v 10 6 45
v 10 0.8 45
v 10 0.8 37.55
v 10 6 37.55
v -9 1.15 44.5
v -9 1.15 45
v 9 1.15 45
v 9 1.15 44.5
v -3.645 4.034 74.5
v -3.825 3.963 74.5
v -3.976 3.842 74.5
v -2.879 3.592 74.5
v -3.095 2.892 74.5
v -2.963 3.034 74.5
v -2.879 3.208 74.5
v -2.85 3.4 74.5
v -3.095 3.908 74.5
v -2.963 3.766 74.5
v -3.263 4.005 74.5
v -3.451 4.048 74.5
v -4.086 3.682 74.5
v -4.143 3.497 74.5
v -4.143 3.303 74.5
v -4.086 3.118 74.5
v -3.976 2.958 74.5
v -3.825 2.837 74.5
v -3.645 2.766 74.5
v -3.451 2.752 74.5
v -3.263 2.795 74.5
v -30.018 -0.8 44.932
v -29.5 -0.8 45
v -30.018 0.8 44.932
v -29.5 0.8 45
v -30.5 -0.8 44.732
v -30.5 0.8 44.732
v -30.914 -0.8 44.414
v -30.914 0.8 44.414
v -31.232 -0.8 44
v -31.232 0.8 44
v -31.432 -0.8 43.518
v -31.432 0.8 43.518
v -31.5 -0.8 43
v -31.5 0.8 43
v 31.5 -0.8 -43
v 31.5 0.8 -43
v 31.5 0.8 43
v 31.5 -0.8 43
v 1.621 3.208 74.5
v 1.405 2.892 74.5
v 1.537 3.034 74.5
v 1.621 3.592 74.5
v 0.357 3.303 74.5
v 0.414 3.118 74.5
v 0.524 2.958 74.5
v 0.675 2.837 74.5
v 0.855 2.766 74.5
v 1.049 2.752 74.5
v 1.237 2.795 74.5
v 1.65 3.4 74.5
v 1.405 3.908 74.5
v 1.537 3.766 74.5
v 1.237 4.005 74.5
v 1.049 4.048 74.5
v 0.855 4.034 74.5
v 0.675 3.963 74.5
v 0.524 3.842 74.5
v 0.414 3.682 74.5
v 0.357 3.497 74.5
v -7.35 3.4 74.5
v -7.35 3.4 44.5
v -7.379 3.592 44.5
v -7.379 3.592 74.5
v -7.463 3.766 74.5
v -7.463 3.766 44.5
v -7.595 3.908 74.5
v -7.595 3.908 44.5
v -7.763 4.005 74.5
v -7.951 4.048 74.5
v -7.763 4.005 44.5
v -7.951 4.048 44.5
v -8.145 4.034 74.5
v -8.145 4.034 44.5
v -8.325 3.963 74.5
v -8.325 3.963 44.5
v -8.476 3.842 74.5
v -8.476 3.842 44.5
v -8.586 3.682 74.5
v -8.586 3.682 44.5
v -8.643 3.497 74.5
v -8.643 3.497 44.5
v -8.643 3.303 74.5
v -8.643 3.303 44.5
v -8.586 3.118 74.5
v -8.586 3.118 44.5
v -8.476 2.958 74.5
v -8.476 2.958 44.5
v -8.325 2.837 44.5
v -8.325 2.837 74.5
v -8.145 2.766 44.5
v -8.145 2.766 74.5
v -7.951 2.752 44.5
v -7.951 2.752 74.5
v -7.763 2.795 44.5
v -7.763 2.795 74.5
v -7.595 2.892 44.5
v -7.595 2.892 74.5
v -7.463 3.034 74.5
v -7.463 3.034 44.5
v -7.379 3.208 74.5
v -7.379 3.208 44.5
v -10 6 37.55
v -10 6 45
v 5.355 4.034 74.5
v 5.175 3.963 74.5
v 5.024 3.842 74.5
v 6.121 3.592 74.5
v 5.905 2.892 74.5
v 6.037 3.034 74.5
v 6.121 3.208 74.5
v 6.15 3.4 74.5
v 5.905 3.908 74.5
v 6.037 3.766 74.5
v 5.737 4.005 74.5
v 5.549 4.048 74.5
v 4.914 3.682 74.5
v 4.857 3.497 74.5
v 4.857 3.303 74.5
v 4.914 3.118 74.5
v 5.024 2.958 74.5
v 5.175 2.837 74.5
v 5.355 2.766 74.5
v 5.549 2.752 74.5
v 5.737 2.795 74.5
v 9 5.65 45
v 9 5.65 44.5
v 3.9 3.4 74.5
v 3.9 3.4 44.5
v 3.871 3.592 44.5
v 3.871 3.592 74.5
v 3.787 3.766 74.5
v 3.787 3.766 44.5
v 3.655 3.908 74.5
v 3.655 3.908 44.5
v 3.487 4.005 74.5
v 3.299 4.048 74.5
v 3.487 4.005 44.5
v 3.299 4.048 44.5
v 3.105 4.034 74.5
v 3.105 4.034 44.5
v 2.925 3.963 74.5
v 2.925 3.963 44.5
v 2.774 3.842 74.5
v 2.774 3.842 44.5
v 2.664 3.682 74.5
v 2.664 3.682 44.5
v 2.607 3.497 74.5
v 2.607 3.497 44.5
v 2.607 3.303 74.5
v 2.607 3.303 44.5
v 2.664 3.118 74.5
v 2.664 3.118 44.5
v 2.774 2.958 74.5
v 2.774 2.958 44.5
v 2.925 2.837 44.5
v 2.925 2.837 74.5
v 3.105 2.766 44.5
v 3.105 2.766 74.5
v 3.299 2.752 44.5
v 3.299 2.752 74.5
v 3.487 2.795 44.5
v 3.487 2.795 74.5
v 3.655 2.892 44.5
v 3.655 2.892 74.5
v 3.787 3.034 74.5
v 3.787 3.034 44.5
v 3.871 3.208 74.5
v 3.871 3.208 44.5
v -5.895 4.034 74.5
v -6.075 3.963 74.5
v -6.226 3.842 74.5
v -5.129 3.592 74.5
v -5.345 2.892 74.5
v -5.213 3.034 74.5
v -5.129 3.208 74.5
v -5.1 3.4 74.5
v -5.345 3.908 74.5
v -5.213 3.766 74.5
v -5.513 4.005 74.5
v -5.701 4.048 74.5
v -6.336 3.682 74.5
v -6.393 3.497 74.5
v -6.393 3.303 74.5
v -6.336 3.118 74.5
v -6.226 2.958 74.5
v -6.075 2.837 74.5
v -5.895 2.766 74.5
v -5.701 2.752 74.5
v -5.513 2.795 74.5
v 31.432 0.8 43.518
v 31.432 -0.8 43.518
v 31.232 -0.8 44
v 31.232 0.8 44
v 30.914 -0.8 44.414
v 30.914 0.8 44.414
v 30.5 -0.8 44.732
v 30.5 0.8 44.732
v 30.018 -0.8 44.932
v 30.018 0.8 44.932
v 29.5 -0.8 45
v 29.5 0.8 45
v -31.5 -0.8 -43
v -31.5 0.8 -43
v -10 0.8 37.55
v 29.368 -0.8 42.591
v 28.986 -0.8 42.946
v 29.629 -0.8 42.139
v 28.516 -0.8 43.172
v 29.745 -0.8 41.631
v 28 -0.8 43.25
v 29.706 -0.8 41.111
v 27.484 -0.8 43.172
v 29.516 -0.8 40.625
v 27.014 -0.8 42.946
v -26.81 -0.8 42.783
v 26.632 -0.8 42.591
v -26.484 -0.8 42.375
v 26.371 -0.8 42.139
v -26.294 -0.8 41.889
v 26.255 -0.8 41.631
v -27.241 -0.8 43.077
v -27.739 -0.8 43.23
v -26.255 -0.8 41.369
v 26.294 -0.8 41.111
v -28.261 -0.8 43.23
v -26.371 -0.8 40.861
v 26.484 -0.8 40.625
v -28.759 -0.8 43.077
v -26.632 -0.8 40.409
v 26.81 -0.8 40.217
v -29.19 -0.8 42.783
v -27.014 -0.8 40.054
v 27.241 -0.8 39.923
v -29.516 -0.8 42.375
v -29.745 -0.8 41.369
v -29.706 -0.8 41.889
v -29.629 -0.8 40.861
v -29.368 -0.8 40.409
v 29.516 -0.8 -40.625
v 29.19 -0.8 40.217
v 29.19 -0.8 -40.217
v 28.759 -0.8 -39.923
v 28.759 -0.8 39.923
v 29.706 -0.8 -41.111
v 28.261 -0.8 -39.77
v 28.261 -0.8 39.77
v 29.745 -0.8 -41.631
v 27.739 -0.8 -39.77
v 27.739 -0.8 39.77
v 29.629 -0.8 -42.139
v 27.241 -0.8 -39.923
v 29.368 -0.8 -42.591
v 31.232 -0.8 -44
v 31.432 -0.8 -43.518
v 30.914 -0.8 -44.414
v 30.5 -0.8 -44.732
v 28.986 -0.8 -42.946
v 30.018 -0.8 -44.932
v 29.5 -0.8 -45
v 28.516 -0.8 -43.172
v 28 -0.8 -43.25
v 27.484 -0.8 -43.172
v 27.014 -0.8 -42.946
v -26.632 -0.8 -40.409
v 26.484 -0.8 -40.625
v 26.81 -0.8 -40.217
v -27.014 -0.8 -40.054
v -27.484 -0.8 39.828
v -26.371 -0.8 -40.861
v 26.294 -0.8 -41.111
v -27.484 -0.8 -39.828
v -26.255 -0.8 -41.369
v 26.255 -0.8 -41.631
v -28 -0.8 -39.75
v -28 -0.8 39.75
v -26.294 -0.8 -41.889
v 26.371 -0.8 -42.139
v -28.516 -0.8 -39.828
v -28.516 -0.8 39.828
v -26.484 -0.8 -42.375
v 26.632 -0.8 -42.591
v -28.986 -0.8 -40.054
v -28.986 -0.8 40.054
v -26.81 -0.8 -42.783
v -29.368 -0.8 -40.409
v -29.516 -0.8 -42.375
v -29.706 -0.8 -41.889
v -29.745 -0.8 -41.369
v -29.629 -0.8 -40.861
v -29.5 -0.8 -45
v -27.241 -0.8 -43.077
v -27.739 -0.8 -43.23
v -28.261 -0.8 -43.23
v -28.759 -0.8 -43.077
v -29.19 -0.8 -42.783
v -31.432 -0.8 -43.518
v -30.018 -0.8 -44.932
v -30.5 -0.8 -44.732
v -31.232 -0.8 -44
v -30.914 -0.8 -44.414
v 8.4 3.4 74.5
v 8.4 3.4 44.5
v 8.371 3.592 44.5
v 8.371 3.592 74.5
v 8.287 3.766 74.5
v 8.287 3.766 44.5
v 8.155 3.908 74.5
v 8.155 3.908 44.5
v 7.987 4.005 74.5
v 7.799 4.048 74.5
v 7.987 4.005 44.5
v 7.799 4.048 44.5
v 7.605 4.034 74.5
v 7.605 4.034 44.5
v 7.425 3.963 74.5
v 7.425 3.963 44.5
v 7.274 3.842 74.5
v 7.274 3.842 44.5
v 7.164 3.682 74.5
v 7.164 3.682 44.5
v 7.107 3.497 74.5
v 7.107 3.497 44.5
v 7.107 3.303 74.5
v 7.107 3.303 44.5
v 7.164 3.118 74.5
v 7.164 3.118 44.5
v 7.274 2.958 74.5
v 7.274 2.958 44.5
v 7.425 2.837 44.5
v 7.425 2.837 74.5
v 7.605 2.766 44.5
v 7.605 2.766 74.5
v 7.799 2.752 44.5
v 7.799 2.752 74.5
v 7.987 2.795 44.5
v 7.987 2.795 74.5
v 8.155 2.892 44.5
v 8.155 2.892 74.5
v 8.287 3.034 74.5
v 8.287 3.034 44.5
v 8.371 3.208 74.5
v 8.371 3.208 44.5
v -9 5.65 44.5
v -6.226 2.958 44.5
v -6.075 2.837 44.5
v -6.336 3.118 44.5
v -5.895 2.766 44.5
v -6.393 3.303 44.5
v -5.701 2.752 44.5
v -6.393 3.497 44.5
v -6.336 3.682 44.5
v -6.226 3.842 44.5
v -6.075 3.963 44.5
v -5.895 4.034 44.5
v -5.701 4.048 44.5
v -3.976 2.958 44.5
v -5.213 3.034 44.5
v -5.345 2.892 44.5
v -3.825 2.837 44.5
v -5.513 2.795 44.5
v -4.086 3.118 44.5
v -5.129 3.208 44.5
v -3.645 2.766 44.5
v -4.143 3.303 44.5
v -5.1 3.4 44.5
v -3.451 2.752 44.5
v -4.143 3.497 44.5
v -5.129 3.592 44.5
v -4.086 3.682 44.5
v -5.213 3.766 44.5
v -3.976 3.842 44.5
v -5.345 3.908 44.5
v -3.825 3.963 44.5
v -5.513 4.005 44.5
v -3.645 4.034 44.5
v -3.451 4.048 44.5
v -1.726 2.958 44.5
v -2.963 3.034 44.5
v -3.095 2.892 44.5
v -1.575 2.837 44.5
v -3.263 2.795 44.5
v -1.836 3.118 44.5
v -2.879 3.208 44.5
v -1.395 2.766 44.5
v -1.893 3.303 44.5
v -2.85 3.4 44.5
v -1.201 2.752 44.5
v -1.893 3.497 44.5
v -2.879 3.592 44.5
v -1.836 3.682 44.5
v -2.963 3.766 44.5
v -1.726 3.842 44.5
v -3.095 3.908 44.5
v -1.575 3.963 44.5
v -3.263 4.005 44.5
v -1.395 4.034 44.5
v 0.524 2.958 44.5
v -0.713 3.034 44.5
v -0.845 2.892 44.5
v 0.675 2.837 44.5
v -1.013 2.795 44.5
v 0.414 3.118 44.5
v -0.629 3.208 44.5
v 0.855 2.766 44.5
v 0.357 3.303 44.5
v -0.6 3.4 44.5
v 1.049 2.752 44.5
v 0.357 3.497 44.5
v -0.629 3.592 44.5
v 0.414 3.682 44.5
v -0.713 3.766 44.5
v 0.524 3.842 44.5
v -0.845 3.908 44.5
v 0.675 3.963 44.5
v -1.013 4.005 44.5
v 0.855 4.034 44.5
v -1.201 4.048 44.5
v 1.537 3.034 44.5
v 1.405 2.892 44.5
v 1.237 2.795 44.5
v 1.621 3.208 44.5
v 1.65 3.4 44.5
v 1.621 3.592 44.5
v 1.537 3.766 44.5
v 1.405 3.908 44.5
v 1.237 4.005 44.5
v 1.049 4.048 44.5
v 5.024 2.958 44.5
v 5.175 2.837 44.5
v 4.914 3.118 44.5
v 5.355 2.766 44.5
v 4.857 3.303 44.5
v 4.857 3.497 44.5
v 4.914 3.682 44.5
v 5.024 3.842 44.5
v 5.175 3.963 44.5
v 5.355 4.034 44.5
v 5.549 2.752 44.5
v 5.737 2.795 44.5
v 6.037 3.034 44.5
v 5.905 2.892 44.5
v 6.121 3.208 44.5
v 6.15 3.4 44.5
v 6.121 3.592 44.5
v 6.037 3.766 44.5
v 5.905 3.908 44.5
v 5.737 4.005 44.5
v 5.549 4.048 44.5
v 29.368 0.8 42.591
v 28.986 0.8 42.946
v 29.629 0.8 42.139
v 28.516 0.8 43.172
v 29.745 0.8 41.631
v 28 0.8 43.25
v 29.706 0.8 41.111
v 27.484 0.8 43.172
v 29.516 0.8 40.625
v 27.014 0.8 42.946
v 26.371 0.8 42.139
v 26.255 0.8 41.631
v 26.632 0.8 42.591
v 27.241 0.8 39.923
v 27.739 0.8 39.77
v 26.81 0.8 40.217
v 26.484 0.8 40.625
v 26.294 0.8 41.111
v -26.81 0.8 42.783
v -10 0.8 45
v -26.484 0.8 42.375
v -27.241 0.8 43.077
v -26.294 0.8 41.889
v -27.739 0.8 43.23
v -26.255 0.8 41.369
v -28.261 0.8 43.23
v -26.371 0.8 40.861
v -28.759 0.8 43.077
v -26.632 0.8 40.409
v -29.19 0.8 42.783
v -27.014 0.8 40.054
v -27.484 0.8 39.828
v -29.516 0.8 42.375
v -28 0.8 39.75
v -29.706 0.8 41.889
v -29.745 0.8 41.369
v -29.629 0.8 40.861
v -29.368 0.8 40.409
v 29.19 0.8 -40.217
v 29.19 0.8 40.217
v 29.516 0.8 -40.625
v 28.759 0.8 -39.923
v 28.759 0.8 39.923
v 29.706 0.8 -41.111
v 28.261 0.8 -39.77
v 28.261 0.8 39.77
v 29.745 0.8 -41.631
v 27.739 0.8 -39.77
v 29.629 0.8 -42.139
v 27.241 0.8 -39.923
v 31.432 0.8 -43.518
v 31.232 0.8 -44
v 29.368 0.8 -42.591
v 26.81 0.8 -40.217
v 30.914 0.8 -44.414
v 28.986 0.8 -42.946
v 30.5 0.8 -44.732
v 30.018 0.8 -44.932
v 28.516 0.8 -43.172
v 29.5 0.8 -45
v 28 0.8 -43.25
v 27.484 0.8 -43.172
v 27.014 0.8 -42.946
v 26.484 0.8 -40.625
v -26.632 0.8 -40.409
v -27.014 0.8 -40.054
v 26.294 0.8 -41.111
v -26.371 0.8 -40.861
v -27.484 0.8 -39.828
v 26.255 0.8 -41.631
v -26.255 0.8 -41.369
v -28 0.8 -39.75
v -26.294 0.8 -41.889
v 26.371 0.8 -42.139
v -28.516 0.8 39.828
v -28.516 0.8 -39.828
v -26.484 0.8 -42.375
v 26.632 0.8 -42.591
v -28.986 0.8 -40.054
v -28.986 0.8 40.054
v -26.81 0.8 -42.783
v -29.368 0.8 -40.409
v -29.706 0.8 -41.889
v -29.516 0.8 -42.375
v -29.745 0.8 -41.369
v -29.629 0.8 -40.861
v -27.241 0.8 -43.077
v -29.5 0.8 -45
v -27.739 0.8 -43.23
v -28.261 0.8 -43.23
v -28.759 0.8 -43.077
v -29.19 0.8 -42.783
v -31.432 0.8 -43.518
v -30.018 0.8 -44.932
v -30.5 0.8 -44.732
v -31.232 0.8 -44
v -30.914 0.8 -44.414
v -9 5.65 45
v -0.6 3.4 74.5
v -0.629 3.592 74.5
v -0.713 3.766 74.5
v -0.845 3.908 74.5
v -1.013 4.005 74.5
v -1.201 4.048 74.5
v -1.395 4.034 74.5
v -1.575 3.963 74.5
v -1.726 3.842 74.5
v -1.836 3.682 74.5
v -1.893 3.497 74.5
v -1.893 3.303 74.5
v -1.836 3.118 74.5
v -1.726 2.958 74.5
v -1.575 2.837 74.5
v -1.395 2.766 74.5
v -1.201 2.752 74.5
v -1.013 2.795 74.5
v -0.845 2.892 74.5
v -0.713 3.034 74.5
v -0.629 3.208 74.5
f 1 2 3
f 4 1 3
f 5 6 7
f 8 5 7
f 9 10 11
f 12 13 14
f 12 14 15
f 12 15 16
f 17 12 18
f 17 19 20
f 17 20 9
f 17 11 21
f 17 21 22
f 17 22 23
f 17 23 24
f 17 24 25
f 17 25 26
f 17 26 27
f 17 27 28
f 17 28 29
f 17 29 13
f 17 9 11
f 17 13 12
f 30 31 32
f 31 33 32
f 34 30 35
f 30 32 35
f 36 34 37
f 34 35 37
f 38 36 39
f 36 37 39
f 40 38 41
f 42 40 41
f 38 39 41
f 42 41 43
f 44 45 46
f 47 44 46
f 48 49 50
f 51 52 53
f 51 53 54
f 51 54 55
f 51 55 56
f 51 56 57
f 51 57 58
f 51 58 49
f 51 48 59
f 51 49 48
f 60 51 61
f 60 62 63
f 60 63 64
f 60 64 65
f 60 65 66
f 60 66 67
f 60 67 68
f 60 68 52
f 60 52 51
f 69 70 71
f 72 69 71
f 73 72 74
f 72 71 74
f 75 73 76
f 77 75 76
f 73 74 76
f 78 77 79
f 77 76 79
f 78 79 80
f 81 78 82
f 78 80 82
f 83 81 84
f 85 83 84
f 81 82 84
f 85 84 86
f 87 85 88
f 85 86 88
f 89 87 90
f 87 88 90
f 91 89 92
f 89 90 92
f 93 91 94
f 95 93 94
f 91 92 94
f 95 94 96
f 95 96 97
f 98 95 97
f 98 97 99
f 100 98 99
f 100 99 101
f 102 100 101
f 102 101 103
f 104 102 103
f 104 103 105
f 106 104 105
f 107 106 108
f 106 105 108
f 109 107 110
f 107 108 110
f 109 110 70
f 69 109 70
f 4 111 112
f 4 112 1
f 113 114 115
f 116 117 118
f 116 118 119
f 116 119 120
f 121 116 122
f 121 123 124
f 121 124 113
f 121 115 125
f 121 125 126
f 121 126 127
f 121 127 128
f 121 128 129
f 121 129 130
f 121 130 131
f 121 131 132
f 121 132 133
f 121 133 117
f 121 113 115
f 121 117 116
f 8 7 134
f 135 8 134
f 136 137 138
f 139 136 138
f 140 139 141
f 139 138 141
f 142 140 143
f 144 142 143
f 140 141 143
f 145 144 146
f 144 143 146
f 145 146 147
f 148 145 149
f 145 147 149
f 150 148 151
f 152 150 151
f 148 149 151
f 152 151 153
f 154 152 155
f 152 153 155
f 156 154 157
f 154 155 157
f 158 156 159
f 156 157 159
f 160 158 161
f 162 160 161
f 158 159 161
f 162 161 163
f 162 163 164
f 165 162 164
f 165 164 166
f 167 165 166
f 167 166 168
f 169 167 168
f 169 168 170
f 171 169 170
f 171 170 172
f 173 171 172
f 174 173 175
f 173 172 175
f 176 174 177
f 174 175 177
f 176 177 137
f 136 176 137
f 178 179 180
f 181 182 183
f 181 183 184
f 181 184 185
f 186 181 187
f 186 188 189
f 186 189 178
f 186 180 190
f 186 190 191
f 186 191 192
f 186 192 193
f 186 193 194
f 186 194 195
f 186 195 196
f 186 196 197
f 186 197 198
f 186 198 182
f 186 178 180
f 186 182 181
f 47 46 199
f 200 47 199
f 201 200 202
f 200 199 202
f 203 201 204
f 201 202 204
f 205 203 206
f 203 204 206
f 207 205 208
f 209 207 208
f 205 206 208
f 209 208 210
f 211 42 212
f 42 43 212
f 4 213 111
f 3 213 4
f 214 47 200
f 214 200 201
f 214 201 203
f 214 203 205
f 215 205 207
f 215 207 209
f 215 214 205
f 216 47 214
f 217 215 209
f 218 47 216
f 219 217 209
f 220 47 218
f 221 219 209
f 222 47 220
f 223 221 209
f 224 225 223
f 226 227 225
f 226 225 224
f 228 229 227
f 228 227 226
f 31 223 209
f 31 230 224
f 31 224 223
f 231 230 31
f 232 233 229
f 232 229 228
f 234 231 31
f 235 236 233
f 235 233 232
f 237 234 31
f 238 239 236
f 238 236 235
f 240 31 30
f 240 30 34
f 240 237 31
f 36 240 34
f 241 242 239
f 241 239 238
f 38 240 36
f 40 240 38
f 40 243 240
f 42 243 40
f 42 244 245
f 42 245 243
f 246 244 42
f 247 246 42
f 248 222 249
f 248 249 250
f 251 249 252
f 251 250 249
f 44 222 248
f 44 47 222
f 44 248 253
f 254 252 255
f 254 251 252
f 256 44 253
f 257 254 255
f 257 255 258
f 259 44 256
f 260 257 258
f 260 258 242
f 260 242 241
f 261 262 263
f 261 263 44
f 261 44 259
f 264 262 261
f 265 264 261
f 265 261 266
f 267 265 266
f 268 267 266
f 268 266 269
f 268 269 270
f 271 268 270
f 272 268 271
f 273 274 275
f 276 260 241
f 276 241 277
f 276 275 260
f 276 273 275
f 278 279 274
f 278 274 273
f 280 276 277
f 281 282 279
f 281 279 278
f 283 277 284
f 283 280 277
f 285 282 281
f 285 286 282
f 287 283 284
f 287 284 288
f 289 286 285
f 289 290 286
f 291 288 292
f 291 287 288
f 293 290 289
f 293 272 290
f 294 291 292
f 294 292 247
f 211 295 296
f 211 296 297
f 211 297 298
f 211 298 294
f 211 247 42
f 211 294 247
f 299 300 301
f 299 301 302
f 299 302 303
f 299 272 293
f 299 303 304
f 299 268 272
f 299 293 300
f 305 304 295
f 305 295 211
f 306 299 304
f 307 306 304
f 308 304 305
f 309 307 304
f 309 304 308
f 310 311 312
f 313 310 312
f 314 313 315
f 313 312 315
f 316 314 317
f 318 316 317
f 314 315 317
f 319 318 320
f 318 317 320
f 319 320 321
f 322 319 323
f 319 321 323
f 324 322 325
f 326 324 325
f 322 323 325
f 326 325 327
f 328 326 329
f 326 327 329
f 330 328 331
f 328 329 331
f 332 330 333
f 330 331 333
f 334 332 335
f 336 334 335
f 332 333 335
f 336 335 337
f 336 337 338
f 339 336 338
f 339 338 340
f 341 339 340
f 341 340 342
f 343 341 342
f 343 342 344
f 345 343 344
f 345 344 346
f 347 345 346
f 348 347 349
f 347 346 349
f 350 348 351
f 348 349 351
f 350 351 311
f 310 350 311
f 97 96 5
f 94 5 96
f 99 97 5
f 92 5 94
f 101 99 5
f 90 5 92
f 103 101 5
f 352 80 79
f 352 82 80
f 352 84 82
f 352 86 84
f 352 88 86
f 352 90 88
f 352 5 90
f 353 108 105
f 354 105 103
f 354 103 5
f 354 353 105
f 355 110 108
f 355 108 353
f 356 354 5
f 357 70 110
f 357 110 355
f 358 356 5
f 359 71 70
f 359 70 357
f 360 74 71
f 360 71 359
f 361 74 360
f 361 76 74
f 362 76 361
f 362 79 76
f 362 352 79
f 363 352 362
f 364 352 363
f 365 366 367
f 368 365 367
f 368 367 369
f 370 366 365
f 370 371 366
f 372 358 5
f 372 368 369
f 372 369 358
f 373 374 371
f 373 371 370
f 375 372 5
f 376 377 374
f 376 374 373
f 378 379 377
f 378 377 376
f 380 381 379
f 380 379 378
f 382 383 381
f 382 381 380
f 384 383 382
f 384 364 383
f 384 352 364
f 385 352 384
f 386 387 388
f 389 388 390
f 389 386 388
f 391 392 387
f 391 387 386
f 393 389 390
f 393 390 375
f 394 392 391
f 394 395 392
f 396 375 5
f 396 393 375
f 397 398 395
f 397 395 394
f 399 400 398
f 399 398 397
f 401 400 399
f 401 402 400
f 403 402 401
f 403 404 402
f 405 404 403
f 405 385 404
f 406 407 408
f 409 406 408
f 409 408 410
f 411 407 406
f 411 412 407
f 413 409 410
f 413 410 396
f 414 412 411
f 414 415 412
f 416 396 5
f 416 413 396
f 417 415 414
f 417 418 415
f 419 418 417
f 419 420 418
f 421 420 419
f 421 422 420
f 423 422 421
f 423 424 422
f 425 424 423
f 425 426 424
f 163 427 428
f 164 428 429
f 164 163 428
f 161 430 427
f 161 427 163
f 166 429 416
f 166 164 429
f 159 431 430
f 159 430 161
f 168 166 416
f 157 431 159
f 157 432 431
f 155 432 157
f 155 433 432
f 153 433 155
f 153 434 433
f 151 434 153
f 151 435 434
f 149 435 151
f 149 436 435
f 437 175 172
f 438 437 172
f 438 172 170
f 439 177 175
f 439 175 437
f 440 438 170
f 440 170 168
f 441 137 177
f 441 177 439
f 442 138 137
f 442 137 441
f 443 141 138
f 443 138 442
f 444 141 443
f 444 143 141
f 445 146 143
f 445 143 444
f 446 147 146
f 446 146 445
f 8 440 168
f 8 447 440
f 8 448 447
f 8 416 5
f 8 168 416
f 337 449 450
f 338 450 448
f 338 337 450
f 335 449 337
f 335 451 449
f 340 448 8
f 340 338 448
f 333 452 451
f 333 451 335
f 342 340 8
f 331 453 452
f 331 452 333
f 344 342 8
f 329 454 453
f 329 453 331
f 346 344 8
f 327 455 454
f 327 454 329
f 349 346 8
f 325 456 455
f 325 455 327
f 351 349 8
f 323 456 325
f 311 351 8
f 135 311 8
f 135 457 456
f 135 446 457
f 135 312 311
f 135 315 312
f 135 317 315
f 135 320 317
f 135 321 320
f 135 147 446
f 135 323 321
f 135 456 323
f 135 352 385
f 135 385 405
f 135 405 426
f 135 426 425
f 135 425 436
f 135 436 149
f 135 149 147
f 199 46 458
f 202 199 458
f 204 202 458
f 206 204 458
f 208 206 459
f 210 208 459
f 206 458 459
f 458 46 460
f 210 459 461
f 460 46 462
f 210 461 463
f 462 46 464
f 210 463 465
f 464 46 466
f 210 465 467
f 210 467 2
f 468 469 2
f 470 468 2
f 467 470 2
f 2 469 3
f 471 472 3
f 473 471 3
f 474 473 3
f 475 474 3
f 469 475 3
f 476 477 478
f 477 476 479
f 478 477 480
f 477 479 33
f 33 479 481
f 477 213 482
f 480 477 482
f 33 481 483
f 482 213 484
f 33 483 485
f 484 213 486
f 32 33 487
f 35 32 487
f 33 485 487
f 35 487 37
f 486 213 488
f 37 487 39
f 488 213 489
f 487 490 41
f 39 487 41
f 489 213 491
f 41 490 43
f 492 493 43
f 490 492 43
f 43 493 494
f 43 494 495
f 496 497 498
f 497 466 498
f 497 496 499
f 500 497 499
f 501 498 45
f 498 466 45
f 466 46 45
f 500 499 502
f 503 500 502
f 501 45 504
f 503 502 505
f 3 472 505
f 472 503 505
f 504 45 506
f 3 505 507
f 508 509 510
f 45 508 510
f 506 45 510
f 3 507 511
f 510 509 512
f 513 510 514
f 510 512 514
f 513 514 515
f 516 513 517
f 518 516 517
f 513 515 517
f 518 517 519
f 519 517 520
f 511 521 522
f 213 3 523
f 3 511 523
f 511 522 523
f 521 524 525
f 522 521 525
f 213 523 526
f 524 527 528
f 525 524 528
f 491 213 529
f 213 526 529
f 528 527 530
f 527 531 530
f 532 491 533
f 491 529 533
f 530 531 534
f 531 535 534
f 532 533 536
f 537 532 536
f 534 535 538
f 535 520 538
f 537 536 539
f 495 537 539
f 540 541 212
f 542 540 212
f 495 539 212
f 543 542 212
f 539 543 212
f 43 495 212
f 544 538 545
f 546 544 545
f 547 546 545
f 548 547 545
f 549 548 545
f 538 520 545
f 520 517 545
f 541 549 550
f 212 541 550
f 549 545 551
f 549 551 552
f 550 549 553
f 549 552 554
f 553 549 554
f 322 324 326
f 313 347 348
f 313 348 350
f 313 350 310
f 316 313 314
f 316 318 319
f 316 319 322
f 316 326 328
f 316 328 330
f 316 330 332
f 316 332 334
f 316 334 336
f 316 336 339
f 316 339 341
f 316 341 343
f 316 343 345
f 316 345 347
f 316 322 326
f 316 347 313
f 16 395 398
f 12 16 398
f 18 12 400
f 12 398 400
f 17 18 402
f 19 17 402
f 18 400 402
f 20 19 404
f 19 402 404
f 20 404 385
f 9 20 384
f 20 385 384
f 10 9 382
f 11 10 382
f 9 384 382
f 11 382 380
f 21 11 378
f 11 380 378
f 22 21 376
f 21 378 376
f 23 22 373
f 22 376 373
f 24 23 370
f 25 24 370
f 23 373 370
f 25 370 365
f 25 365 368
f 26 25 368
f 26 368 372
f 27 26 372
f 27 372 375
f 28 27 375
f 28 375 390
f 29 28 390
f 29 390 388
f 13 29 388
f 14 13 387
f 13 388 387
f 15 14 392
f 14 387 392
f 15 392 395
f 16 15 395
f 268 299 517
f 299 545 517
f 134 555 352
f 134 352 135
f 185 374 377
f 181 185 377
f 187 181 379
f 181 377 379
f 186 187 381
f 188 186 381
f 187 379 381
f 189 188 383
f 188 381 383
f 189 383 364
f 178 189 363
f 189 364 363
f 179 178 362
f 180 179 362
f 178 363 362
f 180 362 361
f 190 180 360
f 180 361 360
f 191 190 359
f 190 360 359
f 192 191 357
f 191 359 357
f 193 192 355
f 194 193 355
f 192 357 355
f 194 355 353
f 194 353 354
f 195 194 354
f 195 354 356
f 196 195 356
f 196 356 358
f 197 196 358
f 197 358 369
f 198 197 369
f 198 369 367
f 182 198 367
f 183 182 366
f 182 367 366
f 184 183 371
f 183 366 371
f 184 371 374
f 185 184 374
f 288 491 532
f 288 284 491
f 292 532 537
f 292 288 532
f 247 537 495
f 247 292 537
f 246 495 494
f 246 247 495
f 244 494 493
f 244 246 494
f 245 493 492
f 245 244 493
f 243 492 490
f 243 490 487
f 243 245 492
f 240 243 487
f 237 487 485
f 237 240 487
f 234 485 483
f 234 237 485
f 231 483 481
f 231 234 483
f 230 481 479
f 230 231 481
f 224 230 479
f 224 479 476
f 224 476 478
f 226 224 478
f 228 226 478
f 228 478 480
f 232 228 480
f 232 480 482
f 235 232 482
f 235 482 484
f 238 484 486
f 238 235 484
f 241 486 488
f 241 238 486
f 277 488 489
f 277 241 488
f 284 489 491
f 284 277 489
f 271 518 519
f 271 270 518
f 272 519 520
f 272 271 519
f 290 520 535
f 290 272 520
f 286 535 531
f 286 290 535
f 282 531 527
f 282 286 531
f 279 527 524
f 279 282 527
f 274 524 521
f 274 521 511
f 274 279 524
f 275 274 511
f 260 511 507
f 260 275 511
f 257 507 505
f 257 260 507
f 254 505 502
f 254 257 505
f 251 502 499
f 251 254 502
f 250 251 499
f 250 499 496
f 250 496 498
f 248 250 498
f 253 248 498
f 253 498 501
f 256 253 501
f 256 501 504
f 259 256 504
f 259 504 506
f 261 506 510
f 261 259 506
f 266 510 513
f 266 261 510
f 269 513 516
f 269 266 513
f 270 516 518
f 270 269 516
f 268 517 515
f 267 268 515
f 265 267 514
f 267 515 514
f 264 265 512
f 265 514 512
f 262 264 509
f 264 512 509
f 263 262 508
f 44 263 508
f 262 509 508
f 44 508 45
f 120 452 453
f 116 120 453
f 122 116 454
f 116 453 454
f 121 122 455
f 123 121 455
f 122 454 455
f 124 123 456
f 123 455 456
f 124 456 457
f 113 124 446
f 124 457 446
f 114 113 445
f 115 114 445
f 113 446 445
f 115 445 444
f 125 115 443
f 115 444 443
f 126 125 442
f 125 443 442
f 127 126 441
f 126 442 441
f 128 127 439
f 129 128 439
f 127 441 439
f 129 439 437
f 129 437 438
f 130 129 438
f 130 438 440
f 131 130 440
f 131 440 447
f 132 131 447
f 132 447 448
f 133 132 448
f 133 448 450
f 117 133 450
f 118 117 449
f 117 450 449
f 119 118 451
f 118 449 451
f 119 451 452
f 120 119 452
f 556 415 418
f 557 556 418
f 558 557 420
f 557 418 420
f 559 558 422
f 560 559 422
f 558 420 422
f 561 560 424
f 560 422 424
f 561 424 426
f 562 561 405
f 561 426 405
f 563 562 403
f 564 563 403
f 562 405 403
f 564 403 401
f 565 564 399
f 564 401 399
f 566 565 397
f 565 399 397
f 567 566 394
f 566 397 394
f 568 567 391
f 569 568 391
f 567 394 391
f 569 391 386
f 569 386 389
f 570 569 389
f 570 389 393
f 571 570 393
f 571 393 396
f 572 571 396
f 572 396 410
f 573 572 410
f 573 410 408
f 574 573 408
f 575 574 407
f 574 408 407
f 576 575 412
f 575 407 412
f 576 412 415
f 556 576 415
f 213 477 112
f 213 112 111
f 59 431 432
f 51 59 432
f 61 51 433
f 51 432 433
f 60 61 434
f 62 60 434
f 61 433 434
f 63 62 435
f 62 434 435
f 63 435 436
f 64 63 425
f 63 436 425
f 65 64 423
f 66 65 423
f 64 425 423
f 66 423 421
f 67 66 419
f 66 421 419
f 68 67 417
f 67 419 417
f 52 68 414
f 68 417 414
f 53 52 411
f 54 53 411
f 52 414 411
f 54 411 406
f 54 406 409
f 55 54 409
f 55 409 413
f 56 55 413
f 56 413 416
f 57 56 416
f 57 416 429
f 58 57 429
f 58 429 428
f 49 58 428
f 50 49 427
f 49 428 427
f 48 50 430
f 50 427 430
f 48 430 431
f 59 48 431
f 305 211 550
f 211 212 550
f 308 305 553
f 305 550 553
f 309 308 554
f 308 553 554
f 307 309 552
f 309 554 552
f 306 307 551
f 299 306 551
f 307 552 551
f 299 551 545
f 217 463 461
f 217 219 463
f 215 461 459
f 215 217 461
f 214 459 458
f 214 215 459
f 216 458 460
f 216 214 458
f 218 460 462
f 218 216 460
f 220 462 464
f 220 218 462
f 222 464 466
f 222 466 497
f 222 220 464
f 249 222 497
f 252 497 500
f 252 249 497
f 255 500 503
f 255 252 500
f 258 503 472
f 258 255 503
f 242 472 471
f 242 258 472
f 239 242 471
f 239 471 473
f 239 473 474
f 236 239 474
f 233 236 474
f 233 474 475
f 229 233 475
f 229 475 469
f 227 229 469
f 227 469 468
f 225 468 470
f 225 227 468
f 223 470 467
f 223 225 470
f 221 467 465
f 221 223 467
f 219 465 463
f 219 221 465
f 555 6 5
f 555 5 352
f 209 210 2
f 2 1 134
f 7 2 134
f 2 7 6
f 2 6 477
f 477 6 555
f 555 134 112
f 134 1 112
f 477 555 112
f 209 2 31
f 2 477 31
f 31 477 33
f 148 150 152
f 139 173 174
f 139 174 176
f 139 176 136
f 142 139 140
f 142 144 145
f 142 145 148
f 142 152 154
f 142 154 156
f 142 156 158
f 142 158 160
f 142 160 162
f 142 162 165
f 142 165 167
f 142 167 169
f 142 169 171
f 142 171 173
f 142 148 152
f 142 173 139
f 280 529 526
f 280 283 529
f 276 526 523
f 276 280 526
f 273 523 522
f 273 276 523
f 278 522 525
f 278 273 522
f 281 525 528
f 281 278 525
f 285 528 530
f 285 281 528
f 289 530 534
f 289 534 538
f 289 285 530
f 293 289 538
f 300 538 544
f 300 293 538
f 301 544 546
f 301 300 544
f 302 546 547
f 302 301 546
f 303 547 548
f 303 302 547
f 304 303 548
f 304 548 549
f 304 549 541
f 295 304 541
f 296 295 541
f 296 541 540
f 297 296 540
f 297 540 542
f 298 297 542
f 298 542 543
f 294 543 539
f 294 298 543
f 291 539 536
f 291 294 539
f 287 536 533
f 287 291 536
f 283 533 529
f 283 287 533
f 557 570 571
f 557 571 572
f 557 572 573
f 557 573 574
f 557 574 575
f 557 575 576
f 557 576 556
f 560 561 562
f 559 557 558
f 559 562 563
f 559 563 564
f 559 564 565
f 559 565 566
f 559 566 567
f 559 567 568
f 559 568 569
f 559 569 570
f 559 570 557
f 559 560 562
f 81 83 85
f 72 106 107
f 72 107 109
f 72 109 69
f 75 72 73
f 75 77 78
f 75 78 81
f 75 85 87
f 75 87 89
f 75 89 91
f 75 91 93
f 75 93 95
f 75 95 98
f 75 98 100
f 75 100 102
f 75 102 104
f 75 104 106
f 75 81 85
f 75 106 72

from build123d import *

# Parameters (mm, degrees)
SKETCH1_R           = 1.75
BOSS_EXTRUDE1_DEPTH = 0.8
SKETCH2_W           = 20
SKETCH2_H           = 7.45
BOSS_EXTRUDE2_DEPTH = 5.2
SKETCH3_W           = 18
SKETCH3_H           = 4.5
CUT_EXTRUDE1_DEPTH  = 0.5
SKETCH4_R           = 0.65
BOSS_EXTRUDE3_DEPTH = 30


with BuildPart() as part:
    # Sketch1 → Boss-Extrude1 (new, symmetric)
    with BuildSketch(Plane(origin=(0, 0, 0), x_dir=(1, 0, 0), z_dir=(0, 1, 0))):
        with BuildLine():
            Line((29.5, -45), (-29.5, -45))
            ThreePointArc((-29.5, -45), (-30.914213562, -44.414213562), (-31.5, -43))
            Line((-31.5, -43), (-31.5, 43))
            ThreePointArc((-31.5, 43), (-30.914213562, 44.414213562), (-29.5, 45))
            Line((-29.5, 45), (29.5, 45))
            ThreePointArc((29.5, 45), (30.914213562, 44.414213562), (31.5, 43))
            Line((31.5, 43), (31.5, -43))
            ThreePointArc((31.5, -43), (30.914213562, -44.414213562), (29.5, -45))
        make_face()
        with Locations(Location((-28, 41.5, 0), (0, 0, 270))):
            Circle(SKETCH1_R, mode=Mode.SUBTRACT)
        with Locations(Location((28, 41.5, 0), (0, 0, 90))):
            Circle(SKETCH1_R, mode=Mode.SUBTRACT)
        with Locations(Location((28, -41.5, 0), (0, 0, 270))):
            Circle(SKETCH1_R, mode=Mode.SUBTRACT)
        with Locations(Location((-28, -41.5, 0), (0, 0, 90))):
            Circle(SKETCH1_R, mode=Mode.SUBTRACT)
    extrude(amount=BOSS_EXTRUDE1_DEPTH, both=True)

    # Sketch2 → Boss-Extrude2 (add)
    with BuildSketch(Plane(origin=(0, 0.8, 0), x_dir=(1, 0, 0), z_dir=(0, 1, 0))):
        with Locations((0, -41.275)):
            Rectangle(SKETCH2_W, SKETCH2_H)
    extrude(amount=BOSS_EXTRUDE2_DEPTH)

    # Sketch3 → Cut-Extrude1 (cut)
    with BuildSketch(Plane.XY.offset(45)):
        with Locations((0, 3.4)):
            Rectangle(SKETCH3_W, SKETCH3_H)
    extrude(amount=-CUT_EXTRUDE1_DEPTH, mode=Mode.SUBTRACT)

    # Sketch4 → Boss-Extrude3 (add)
    with BuildSketch(Plane.XY.offset(44.5)):
        with Locations((-8, 3.4)):
            Circle(SKETCH4_R)
        with Locations((-5.75, 3.4)):
            Circle(SKETCH4_R)
        with Locations((-3.5, 3.4)):
            Circle(SKETCH4_R)
        with Locations((-1.25, 3.4)):
            Circle(SKETCH4_R)
        with Locations((1, 3.4)):
            Circle(SKETCH4_R)
        with Locations((3.25, 3.4)):
            Circle(SKETCH4_R)
        with Locations((5.5, 3.4)):
            Circle(SKETCH4_R)
        with Locations((7.75, 3.4)):
            Circle(SKETCH4_R)
    extrude(amount=BOSS_EXTRUDE3_DEPTH)


solid = part.part
